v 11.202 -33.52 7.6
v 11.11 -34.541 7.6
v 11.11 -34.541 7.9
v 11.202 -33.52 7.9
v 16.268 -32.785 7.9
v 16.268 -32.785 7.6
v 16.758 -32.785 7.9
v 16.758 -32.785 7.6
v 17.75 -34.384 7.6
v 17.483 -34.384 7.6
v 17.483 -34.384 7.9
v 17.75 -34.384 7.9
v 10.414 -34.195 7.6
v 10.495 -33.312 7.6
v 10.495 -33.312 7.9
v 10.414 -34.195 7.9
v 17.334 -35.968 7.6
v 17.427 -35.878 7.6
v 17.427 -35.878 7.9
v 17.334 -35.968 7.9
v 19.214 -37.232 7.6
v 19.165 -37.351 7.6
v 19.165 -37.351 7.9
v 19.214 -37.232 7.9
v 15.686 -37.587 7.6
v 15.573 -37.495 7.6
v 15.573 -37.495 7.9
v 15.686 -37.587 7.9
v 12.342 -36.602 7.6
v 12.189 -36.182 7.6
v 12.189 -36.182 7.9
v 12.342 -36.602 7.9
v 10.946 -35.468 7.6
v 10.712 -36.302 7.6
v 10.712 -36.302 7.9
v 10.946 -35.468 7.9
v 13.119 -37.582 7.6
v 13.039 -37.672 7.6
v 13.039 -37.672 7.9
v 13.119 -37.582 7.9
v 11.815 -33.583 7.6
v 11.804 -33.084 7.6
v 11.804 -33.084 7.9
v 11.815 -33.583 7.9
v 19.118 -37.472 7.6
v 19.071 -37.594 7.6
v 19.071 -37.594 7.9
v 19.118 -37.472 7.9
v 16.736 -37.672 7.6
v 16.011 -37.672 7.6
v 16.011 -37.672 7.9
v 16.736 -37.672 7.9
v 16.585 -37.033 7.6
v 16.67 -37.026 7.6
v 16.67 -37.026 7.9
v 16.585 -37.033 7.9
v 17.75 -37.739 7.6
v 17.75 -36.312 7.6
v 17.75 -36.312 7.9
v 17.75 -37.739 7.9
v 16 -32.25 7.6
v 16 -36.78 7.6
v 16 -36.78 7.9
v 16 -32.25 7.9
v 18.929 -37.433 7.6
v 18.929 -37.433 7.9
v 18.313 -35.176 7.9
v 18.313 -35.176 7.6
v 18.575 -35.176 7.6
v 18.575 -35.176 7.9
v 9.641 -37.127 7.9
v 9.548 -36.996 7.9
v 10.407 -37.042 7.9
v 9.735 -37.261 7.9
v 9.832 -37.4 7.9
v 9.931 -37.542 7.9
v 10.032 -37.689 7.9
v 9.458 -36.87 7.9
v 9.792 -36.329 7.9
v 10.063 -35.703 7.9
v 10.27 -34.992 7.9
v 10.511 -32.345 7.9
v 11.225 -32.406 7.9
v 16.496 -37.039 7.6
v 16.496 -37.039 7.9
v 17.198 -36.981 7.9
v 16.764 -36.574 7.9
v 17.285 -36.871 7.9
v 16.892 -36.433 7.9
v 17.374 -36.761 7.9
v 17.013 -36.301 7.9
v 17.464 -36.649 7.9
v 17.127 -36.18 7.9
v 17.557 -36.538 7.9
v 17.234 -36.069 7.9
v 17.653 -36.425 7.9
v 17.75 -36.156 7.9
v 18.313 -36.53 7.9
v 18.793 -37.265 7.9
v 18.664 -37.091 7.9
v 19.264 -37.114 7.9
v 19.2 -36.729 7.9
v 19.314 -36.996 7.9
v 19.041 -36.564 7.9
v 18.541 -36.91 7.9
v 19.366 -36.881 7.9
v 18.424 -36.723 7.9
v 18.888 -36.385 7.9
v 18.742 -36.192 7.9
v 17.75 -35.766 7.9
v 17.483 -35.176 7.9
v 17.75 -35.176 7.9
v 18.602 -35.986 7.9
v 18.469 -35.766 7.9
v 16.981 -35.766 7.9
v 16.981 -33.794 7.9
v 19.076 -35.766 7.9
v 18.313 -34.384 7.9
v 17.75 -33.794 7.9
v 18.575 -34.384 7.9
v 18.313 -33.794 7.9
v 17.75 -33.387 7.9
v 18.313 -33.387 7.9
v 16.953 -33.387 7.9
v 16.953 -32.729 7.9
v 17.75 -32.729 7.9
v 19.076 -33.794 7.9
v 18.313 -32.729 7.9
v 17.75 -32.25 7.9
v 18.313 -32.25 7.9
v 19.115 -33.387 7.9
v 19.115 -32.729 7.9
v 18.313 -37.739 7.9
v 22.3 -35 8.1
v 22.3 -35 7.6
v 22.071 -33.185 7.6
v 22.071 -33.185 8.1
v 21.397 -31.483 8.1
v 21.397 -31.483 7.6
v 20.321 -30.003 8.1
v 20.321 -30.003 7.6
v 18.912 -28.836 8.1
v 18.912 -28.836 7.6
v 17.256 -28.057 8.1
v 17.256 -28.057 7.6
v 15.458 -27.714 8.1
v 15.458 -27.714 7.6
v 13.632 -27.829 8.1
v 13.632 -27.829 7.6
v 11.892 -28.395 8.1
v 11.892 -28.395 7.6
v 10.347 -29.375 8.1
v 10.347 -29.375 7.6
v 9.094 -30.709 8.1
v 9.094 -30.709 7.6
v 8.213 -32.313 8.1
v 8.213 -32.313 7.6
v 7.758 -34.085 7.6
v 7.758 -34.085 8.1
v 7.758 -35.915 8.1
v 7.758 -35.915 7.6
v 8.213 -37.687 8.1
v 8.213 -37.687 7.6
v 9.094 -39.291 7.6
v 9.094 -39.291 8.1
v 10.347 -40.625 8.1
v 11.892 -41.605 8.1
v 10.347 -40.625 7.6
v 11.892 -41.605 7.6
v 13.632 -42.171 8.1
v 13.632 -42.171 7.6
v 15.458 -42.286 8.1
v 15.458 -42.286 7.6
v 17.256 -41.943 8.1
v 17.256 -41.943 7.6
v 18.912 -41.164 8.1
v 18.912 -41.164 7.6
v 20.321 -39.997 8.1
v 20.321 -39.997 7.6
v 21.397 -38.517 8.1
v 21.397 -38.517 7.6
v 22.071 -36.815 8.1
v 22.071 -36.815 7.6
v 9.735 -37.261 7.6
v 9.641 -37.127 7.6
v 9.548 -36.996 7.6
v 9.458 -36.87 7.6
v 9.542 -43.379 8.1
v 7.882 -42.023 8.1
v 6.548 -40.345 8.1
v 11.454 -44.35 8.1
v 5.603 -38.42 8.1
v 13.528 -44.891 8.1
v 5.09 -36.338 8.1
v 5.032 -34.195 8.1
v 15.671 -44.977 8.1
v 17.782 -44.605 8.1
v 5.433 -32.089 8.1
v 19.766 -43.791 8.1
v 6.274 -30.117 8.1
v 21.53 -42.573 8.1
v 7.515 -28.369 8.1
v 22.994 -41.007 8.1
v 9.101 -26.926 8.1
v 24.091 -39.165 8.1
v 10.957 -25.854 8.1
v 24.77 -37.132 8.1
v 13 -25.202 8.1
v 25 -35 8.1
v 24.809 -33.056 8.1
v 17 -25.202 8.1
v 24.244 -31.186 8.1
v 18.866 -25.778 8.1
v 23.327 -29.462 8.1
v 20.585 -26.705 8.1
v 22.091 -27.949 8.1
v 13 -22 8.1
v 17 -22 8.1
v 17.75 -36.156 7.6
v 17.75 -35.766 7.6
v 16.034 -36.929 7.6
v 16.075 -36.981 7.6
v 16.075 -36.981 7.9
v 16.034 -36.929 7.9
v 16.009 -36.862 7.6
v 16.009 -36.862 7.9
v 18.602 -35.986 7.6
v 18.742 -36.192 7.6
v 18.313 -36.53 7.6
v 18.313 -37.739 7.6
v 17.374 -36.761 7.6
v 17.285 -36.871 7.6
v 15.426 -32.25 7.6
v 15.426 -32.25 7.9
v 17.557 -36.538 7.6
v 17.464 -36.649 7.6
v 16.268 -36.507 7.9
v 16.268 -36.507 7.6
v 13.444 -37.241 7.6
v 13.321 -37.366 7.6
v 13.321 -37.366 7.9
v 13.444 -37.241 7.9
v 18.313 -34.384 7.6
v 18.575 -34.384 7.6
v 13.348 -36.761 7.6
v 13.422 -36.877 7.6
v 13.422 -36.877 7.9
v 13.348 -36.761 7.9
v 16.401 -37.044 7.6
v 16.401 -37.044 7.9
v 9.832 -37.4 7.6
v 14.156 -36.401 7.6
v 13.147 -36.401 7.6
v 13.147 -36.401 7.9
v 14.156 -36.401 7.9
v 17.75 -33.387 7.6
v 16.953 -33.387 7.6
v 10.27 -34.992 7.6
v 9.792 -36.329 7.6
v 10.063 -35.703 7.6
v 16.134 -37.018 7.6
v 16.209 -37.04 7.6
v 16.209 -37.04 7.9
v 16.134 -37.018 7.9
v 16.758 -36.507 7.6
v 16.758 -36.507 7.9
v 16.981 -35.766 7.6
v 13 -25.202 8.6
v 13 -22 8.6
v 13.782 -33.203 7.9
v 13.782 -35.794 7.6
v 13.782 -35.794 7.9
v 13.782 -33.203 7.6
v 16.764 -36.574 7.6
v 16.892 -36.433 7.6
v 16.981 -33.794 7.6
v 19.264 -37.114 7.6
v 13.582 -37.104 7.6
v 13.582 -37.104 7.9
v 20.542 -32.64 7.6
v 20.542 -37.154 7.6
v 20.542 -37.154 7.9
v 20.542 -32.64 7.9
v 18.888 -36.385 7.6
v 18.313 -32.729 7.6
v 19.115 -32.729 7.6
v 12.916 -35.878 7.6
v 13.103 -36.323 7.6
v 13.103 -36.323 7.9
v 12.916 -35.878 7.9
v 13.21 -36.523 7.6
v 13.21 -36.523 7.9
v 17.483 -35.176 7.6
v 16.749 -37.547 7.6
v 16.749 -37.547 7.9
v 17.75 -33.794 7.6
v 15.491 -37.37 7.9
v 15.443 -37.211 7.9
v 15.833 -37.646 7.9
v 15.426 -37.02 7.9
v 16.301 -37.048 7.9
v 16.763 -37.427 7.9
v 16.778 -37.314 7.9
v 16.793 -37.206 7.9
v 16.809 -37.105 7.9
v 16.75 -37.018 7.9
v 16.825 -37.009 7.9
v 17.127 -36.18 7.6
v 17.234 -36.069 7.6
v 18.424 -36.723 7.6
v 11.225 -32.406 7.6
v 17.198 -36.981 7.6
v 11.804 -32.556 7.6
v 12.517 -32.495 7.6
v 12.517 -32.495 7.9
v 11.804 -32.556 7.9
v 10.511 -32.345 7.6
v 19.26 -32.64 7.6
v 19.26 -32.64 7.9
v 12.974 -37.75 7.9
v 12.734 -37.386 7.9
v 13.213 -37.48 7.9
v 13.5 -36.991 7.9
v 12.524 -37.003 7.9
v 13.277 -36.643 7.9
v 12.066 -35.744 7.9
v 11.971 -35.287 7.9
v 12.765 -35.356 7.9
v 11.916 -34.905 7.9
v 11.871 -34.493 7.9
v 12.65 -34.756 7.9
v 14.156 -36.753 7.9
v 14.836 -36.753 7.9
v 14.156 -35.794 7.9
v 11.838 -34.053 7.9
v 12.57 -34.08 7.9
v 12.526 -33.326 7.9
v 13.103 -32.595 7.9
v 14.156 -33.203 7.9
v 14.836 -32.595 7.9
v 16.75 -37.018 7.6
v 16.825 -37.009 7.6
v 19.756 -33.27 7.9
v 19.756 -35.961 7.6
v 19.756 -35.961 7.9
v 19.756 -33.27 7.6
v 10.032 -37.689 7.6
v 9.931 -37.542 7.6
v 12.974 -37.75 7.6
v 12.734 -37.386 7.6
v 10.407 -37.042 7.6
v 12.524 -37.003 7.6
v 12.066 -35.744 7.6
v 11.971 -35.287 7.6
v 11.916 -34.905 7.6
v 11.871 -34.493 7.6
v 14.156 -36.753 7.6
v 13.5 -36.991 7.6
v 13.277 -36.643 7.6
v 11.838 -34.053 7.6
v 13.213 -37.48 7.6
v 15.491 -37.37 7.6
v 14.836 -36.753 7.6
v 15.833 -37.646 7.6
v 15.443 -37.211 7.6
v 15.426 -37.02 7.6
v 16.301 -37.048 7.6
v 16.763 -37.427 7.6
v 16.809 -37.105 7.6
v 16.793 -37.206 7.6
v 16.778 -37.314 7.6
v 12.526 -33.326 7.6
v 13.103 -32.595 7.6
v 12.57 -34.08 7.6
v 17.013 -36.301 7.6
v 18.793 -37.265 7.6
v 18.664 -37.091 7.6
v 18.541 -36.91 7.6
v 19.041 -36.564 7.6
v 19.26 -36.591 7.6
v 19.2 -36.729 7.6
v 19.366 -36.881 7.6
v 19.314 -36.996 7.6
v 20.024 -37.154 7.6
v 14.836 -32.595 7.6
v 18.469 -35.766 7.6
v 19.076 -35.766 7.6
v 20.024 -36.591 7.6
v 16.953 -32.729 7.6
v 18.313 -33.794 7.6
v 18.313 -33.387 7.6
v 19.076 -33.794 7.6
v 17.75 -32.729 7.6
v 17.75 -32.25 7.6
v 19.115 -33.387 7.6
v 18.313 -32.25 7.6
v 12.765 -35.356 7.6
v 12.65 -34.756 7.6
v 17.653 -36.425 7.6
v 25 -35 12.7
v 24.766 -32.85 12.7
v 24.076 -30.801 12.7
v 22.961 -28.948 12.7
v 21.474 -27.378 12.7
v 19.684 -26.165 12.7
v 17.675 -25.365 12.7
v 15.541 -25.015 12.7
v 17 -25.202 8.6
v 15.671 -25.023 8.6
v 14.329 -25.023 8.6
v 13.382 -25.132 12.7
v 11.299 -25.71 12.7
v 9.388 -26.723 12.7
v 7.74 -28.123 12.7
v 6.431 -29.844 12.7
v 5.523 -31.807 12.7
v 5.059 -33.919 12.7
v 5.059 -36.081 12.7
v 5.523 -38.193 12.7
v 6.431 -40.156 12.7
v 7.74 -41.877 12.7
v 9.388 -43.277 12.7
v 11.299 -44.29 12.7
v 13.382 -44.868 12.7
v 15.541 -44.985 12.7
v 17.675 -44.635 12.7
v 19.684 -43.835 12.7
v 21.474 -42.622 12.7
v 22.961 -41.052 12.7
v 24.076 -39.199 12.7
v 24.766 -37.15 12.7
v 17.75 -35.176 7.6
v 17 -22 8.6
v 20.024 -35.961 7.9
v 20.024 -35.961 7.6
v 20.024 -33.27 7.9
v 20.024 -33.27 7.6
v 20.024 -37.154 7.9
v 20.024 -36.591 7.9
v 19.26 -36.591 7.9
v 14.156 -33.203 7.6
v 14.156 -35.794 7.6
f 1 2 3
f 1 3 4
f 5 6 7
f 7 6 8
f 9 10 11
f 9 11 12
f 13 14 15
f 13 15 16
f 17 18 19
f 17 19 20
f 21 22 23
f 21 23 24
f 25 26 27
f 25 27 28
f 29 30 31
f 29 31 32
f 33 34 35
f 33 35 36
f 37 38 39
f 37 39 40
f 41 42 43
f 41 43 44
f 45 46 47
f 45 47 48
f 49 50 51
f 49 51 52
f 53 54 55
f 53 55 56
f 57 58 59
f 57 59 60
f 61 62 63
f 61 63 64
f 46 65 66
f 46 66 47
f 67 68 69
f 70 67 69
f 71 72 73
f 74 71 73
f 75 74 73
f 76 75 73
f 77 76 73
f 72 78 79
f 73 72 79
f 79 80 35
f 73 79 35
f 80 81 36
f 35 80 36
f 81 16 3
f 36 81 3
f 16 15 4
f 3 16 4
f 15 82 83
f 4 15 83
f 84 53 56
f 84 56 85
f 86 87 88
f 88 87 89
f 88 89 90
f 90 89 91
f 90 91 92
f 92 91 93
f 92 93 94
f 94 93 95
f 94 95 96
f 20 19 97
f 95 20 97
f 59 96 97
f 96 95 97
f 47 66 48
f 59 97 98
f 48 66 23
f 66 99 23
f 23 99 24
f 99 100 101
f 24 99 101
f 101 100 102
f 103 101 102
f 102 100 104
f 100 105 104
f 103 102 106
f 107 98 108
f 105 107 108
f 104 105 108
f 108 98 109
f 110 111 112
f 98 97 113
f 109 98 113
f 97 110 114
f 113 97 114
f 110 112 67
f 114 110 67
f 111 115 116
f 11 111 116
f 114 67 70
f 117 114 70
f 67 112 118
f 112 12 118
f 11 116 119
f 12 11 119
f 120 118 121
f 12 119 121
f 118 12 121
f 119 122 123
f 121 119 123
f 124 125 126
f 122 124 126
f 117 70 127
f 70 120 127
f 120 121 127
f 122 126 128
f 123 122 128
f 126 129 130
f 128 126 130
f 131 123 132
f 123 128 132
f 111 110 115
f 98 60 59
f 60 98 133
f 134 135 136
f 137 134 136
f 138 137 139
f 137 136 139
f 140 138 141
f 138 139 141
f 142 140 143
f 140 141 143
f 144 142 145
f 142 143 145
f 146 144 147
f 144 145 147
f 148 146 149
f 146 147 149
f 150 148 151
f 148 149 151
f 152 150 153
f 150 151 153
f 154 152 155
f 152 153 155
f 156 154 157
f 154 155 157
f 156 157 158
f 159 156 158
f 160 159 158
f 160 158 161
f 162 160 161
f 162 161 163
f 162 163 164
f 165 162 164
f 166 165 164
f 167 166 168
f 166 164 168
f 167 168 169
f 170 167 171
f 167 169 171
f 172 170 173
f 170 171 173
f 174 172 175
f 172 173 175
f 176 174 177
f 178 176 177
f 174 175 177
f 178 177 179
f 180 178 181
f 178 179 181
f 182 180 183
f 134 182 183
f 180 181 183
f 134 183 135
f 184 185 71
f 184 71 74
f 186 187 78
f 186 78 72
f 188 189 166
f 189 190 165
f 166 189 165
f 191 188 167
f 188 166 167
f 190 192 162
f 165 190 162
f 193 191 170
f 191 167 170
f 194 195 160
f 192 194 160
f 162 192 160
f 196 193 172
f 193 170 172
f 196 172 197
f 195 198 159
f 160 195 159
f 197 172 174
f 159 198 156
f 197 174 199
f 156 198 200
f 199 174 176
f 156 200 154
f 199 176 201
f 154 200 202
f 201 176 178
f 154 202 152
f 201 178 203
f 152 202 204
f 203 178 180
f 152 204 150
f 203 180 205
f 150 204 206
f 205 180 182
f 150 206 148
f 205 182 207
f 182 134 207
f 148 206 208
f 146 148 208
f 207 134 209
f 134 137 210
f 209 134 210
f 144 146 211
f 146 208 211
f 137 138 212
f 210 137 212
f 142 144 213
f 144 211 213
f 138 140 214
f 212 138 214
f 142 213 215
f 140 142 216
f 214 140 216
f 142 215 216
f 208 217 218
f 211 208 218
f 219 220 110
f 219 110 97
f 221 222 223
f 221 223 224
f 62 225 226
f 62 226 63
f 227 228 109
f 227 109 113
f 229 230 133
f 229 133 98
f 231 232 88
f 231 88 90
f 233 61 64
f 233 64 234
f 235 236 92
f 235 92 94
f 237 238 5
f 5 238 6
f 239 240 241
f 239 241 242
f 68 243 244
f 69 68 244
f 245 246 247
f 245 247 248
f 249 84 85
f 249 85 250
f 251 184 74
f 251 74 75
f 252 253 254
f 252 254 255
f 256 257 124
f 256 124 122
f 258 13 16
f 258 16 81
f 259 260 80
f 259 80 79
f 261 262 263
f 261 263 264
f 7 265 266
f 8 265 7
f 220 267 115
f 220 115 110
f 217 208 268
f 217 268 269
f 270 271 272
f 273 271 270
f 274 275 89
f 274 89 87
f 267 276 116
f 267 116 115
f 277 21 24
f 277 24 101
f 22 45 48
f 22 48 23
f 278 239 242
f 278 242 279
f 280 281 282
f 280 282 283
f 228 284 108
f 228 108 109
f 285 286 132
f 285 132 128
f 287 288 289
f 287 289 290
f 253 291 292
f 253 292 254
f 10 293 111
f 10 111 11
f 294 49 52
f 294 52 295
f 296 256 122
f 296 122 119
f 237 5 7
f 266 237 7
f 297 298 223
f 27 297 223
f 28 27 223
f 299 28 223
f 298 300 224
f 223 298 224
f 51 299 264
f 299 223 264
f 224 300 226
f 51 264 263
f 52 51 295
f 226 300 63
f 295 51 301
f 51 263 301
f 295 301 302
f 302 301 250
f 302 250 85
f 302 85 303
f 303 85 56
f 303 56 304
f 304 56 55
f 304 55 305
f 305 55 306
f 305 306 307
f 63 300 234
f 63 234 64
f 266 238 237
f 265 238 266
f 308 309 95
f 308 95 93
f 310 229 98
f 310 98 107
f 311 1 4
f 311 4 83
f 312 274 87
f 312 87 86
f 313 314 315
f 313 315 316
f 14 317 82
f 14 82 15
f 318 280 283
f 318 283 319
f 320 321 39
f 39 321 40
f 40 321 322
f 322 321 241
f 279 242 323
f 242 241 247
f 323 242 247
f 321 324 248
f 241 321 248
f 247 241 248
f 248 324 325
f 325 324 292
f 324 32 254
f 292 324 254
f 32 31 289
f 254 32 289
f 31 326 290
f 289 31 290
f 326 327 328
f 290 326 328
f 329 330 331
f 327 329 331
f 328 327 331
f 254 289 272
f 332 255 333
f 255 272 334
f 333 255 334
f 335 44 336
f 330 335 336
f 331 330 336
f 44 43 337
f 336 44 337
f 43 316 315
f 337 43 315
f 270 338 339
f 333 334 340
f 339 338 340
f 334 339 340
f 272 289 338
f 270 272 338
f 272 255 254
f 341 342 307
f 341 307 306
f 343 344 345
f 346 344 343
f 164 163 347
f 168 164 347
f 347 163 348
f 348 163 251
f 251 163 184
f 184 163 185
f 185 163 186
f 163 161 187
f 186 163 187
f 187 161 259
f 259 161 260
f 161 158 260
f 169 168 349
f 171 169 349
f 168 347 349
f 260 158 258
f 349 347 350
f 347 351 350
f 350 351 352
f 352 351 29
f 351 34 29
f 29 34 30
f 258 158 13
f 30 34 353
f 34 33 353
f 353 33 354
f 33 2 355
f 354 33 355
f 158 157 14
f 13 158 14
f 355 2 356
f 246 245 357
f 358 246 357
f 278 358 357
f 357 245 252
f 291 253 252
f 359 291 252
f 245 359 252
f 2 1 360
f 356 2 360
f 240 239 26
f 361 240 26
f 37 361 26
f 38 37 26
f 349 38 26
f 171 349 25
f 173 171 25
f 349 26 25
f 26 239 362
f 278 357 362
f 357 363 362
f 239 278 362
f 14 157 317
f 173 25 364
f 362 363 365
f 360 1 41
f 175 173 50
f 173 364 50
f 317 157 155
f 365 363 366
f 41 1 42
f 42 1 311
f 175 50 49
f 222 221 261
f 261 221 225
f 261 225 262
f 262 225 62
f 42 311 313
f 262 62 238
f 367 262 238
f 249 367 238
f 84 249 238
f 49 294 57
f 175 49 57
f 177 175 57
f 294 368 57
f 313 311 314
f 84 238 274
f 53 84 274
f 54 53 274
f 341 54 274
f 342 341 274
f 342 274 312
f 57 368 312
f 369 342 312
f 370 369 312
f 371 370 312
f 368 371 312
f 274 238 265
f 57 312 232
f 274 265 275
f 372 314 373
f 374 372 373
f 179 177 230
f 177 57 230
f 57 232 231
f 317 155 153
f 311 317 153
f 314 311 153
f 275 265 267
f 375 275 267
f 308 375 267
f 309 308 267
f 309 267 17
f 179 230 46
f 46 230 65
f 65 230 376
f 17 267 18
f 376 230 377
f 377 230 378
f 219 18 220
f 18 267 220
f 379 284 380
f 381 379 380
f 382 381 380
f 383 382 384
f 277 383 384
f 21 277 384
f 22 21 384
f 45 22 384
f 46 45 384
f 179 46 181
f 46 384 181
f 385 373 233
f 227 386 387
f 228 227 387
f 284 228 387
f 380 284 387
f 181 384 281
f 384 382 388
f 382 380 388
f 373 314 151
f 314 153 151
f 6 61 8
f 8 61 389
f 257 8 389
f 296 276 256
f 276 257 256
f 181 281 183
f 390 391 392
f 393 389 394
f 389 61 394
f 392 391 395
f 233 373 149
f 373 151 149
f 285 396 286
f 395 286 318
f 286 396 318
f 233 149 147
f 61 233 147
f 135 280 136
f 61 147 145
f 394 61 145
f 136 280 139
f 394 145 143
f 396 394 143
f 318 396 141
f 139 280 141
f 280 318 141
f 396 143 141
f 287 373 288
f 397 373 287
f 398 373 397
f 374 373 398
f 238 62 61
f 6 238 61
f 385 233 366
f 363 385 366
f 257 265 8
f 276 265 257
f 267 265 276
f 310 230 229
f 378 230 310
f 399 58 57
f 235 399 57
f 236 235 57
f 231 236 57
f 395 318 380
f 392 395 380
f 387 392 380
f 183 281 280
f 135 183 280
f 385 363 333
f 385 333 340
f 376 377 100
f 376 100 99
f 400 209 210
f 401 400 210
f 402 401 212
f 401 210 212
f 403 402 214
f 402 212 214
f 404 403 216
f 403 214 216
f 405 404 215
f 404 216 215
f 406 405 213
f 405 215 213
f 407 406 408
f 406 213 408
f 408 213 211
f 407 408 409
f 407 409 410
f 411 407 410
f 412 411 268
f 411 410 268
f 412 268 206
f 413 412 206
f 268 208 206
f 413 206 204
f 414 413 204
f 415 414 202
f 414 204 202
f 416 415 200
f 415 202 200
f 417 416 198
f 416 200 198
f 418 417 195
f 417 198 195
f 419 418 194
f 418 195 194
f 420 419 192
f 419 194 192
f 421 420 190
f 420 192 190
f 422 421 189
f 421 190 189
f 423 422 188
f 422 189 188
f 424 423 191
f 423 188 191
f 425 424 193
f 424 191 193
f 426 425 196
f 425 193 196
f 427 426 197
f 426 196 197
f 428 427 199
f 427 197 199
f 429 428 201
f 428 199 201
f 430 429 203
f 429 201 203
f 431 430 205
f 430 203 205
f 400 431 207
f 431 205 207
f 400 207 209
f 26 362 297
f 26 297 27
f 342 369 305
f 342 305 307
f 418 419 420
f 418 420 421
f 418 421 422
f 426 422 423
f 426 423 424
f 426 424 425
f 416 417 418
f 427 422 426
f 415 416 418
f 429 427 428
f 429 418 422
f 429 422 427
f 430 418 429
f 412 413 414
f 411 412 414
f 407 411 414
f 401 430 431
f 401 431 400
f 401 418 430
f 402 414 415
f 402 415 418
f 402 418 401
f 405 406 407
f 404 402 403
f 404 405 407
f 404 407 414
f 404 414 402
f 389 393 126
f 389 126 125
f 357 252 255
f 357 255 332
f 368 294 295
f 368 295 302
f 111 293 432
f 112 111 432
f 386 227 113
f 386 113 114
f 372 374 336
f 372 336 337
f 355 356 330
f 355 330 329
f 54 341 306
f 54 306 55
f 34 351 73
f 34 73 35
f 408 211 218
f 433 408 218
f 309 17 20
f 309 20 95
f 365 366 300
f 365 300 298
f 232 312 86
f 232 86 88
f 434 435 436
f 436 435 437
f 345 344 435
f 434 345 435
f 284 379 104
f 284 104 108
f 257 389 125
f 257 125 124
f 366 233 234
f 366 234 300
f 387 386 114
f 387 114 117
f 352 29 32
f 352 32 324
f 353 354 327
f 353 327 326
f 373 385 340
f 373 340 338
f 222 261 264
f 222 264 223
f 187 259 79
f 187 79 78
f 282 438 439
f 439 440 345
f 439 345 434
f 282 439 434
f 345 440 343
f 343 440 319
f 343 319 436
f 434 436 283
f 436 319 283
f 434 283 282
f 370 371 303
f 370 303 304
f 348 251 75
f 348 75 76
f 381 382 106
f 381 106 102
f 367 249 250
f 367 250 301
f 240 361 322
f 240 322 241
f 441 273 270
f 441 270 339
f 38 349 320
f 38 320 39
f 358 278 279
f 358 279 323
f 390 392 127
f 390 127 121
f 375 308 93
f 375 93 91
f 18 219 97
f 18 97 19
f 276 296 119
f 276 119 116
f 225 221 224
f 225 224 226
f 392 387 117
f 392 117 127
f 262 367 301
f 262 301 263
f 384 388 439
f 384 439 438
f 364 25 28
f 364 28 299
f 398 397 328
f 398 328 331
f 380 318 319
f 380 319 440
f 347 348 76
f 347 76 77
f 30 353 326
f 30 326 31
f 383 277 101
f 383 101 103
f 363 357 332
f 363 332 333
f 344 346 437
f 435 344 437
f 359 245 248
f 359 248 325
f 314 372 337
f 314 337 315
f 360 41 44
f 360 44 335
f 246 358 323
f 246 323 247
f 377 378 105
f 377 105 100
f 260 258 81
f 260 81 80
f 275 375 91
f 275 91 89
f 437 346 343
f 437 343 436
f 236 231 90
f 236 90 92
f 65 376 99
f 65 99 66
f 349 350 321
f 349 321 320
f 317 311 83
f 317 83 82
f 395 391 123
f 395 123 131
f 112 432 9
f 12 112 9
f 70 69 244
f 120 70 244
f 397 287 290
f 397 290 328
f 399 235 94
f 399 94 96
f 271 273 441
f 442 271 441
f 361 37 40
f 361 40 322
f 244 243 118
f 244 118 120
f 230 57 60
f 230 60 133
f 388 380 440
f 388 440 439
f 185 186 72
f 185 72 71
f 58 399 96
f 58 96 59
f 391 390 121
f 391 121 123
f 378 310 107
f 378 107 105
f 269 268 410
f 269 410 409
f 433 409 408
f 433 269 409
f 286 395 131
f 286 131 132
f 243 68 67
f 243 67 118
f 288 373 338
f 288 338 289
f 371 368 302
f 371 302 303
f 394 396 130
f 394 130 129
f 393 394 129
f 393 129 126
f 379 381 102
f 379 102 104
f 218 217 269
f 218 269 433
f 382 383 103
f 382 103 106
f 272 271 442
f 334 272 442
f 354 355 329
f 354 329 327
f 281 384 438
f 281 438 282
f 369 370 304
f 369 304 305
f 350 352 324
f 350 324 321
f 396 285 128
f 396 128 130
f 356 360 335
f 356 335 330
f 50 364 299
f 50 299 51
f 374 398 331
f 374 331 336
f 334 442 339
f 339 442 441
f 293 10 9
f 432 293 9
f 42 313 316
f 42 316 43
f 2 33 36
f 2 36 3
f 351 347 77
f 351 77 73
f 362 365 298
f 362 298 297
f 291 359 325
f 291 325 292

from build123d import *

# Parameters (mm, degrees)
SKETCH_230_R          = 7.3
EXTRUDE_254_DEPTH     = 0.5
SKETCH_305_R          = 10
EXTRUDE_323_DEPTH     = 4.6
SKETCH_364_W          = 4
SKETCH_364_H          = 4
EXTRUDE_412_DEPTH     = 0.5
SKETCH_471_W          = 0.267477204
SKETCH_471_H          = 0.791286728
SKETCH_471_W_2        = 0.261904762
SKETCH_471_H_2        = 2.691489362
SKETCH_471_W_3        = 0.490374874
SKETCH_471_H_3        = 3.722391084
SKETCH_471_W_4        = 0.373353597
SKETCH_471_H_4        = 2.59118541
CUT_EXTRUDE_814_DEPTH = 0.3


with BuildPart() as part:
    # Sketch 230 → Extrude 254 (new body)
    with BuildSketch(Plane.XY.offset(7.6)):
        with Locations((15, -35)):
            Circle(SKETCH_230_R)
    extrude(amount=EXTRUDE_254_DEPTH)

    # Sketch 305 → Extrude 323 (add)
    with BuildSketch(Plane.XY.offset(8.1)):
        with Locations((15, -35)):
            Circle(SKETCH_305_R)
    extrude(amount=EXTRUDE_323_DEPTH)

    # Sketch 364 → Extrude 412 (add)
    with BuildSketch(Plane.XY.offset(8.1)):
        with Locations((15, -24)):
            Rectangle(SKETCH_364_W, SKETCH_364_H)
    extrude(amount=EXTRUDE_412_DEPTH)

    # Sketch 471 → Cut-Extrude 814 (cut)
    # profile 1 of 6: a face of its own
    with BuildSketch(Plane.XY.offset(7.6)):
        Polygon((19.076241135, -35.76621074), (19.076241135, -33.793566363), (18.312816616, -33.793566363), (18.312816616, -33.386778116), (19.115248227, -33.386778116), (19.115248227, -32.72922999), (18.312816616, -32.72922999), (18.312816616, -32.25), (17.75, -32.25), (17.75, -32.72922999), (16.953140831, -32.72922999), (16.953140831, -33.386778116), (17.75, -33.386778116), (17.75, -33.793566363), (16.98100304, -33.793566363), (16.98100304, -35.76621074), (17.75, -35.76621074), (17.75, -36.156281662), (17.426798379, -35.877659574), (17.33407914, -35.968211753), (17.234239559, -36.068980074), (17.127279635, -36.179964539), (17.01319937, -36.301165147), (16.891998762, -36.432581898), (16.763677812, -36.574214792), (17.198328267, -36.98100304), (17.284855905, -36.871102105), (17.373550602, -36.760582011), (17.464412361, -36.649442756), (17.55744118, -36.537684341), (17.65263706, -36.425306766), (17.75, -36.31231003), (17.75, -37.738855117), (18.312816616, -37.738855117), (18.312816616, -36.529635258), (18.423646291, -36.723277609), (18.540667567, -36.910418777), (18.663880446, -37.091058764), (18.793284926, -37.265197568), (18.928881009, -37.432835191), (19.070668693, -37.593971631), (19.117570078, -37.471997073), (19.165400203, -37.351260835), (19.214159068, -37.231762918), (19.263846673, -37.113503321), (19.314463019, -36.996482044), (19.366008105, -36.880699088), (19.200227964, -36.729004841), (19.040949004, -36.563689069), (18.888171226, -36.384751773), (18.74189463, -36.192192953), (18.602119216, -35.986012608), (18.468844985, -35.76621074), align=None)
        with Locations((17.616261398, -34.779888551)):
            Rectangle(SKETCH_471_W, SKETCH_471_H, mode=Mode.SUBTRACT)
        with Locations((18.443768997, -34.779888551)):
            Rectangle(SKETCH_471_W_2, SKETCH_471_H, mode=Mode.SUBTRACT)
    # profile 2 of 6: a face of its own
    with BuildSketch(Plane.XY.offset(7.6)):
        Polygon((19.260131712, -32.640070922), (19.260131712, -36.590932118), (20.023556231, -36.590932118), (20.023556231, -37.153748734), (20.541793313, -37.153748734), (20.541793313, -32.640070922), align=None)
        with Locations((19.889817629, -34.61550152)):
            Rectangle(SKETCH_471_W, SKETCH_471_H_2, mode=Mode.SUBTRACT)
    # profile 3 of 6: a face of its own
    with BuildSketch(Plane.XY.offset(7.6)):
        Polygon((16.000253293, -32.25), (15.426291793, -32.25), (15.426291793, -37.020010132), (15.442544748, -37.211485422), (15.491303614, -37.369835641), (15.572568389, -37.49506079), (15.686339075, -37.587160869), (15.83261567, -37.646135878), (16.011398176, -37.671985816), (16.735815603, -37.671985816), (16.749127547, -37.546760666), (16.763058651, -37.427417539), (16.777608916, -37.313956434), (16.792778341, -37.20637735), (16.808566926, -37.104680288), (16.824974671, -37.008865248), (16.750056287, -37.017688281), (16.670184622, -37.025582573), (16.585359676, -37.032548126), (16.495581448, -37.038584938), (16.400849938, -37.043693009), (16.301165147, -37.04787234), (16.209219858, -37.040442418), (16.133991895, -37.018152651), (16.075481256, -36.98100304), (16.033687943, -36.928993583), (16.008611955, -36.862124282), (16.000253293, -36.780395137), align=None)
    # profile 4 of 6: a face of its own
    with BuildSketch(Plane.XY.offset(7.6)):
        with Locations((16.512917933, -34.646149949)):
            Rectangle(SKETCH_471_W_3, SKETCH_471_H_3)
    # profile 5 of 6: a face of its own
    with BuildSketch(Plane.XY.offset(7.6)):
        Polygon((14.835612969, -32.595491388), (13.102583587, -32.595491388), (13.102583587, -36.323454914), (12.916061578, -35.878123945), (12.765141281, -35.355707531), (12.649822695, -34.756205674), (12.57010582, -34.079618372), (12.525990656, -33.325945626), (12.517477204, -32.495187437), (11.804204661, -32.556484296), (11.804204661, -33.084318361), (11.815349544, -33.583051897), (11.837639311, -34.052684904), (11.871073961, -34.493217382), (11.915653495, -34.90464933), (11.971377913, -35.28698075), (12.065799842, -35.743920973), (12.189322301, -36.18228639), (12.341945289, -36.602077001), (12.523668806, -37.003292806), (12.734492852, -37.385933806), (12.974417427, -37.75), (13.039274457, -37.671676236), (13.118681752, -37.581588427), (13.212639311, -37.479736575), (13.321147135, -37.36612068), (13.444205223, -37.240740741), (13.581813576, -37.103596758), (13.500084431, -36.991219183), (13.422070247, -36.876984127), (13.347771023, -36.760891591), (13.277186761, -36.642941574), (13.21031746, -36.523134076), (13.147163121, -36.401469098), (14.155775076, -36.401469098), (14.155775076, -36.752532928), (14.835612969, -36.752532928), align=None)
        with Locations((13.969098278, -34.498480243)):
            Rectangle(SKETCH_471_W_4, SKETCH_471_H_4, mode=Mode.SUBTRACT)
    # profile 6 of 6: a face of its own
    with BuildSketch(Plane.XY.offset(7.6)):
        Polygon((10.511398176, -32.34473151), (10.494526061, -33.312478892), (10.414190026, -34.194782168), (10.270390071, -34.991641337), (10.063126196, -35.7030564), (9.792398401, -36.329027356), (9.458206687, -36.869554205), (9.548449285, -36.996017674), (9.640858944, -37.126505685), (9.735435664, -37.261018237), (9.832179444, -37.39955533), (9.931090285, -37.542116965), (10.032168186, -37.688703141), (10.407379264, -37.041990319), (10.712006079, -36.301784307), (10.946048632, -35.468085106), (11.109506923, -34.540892716), (11.202380952, -33.520207137), (11.224670719, -32.406028369), align=None)
    extrude(amount=CUT_EXTRUDE_814_DEPTH, mode=Mode.SUBTRACT)


solid = part.part
